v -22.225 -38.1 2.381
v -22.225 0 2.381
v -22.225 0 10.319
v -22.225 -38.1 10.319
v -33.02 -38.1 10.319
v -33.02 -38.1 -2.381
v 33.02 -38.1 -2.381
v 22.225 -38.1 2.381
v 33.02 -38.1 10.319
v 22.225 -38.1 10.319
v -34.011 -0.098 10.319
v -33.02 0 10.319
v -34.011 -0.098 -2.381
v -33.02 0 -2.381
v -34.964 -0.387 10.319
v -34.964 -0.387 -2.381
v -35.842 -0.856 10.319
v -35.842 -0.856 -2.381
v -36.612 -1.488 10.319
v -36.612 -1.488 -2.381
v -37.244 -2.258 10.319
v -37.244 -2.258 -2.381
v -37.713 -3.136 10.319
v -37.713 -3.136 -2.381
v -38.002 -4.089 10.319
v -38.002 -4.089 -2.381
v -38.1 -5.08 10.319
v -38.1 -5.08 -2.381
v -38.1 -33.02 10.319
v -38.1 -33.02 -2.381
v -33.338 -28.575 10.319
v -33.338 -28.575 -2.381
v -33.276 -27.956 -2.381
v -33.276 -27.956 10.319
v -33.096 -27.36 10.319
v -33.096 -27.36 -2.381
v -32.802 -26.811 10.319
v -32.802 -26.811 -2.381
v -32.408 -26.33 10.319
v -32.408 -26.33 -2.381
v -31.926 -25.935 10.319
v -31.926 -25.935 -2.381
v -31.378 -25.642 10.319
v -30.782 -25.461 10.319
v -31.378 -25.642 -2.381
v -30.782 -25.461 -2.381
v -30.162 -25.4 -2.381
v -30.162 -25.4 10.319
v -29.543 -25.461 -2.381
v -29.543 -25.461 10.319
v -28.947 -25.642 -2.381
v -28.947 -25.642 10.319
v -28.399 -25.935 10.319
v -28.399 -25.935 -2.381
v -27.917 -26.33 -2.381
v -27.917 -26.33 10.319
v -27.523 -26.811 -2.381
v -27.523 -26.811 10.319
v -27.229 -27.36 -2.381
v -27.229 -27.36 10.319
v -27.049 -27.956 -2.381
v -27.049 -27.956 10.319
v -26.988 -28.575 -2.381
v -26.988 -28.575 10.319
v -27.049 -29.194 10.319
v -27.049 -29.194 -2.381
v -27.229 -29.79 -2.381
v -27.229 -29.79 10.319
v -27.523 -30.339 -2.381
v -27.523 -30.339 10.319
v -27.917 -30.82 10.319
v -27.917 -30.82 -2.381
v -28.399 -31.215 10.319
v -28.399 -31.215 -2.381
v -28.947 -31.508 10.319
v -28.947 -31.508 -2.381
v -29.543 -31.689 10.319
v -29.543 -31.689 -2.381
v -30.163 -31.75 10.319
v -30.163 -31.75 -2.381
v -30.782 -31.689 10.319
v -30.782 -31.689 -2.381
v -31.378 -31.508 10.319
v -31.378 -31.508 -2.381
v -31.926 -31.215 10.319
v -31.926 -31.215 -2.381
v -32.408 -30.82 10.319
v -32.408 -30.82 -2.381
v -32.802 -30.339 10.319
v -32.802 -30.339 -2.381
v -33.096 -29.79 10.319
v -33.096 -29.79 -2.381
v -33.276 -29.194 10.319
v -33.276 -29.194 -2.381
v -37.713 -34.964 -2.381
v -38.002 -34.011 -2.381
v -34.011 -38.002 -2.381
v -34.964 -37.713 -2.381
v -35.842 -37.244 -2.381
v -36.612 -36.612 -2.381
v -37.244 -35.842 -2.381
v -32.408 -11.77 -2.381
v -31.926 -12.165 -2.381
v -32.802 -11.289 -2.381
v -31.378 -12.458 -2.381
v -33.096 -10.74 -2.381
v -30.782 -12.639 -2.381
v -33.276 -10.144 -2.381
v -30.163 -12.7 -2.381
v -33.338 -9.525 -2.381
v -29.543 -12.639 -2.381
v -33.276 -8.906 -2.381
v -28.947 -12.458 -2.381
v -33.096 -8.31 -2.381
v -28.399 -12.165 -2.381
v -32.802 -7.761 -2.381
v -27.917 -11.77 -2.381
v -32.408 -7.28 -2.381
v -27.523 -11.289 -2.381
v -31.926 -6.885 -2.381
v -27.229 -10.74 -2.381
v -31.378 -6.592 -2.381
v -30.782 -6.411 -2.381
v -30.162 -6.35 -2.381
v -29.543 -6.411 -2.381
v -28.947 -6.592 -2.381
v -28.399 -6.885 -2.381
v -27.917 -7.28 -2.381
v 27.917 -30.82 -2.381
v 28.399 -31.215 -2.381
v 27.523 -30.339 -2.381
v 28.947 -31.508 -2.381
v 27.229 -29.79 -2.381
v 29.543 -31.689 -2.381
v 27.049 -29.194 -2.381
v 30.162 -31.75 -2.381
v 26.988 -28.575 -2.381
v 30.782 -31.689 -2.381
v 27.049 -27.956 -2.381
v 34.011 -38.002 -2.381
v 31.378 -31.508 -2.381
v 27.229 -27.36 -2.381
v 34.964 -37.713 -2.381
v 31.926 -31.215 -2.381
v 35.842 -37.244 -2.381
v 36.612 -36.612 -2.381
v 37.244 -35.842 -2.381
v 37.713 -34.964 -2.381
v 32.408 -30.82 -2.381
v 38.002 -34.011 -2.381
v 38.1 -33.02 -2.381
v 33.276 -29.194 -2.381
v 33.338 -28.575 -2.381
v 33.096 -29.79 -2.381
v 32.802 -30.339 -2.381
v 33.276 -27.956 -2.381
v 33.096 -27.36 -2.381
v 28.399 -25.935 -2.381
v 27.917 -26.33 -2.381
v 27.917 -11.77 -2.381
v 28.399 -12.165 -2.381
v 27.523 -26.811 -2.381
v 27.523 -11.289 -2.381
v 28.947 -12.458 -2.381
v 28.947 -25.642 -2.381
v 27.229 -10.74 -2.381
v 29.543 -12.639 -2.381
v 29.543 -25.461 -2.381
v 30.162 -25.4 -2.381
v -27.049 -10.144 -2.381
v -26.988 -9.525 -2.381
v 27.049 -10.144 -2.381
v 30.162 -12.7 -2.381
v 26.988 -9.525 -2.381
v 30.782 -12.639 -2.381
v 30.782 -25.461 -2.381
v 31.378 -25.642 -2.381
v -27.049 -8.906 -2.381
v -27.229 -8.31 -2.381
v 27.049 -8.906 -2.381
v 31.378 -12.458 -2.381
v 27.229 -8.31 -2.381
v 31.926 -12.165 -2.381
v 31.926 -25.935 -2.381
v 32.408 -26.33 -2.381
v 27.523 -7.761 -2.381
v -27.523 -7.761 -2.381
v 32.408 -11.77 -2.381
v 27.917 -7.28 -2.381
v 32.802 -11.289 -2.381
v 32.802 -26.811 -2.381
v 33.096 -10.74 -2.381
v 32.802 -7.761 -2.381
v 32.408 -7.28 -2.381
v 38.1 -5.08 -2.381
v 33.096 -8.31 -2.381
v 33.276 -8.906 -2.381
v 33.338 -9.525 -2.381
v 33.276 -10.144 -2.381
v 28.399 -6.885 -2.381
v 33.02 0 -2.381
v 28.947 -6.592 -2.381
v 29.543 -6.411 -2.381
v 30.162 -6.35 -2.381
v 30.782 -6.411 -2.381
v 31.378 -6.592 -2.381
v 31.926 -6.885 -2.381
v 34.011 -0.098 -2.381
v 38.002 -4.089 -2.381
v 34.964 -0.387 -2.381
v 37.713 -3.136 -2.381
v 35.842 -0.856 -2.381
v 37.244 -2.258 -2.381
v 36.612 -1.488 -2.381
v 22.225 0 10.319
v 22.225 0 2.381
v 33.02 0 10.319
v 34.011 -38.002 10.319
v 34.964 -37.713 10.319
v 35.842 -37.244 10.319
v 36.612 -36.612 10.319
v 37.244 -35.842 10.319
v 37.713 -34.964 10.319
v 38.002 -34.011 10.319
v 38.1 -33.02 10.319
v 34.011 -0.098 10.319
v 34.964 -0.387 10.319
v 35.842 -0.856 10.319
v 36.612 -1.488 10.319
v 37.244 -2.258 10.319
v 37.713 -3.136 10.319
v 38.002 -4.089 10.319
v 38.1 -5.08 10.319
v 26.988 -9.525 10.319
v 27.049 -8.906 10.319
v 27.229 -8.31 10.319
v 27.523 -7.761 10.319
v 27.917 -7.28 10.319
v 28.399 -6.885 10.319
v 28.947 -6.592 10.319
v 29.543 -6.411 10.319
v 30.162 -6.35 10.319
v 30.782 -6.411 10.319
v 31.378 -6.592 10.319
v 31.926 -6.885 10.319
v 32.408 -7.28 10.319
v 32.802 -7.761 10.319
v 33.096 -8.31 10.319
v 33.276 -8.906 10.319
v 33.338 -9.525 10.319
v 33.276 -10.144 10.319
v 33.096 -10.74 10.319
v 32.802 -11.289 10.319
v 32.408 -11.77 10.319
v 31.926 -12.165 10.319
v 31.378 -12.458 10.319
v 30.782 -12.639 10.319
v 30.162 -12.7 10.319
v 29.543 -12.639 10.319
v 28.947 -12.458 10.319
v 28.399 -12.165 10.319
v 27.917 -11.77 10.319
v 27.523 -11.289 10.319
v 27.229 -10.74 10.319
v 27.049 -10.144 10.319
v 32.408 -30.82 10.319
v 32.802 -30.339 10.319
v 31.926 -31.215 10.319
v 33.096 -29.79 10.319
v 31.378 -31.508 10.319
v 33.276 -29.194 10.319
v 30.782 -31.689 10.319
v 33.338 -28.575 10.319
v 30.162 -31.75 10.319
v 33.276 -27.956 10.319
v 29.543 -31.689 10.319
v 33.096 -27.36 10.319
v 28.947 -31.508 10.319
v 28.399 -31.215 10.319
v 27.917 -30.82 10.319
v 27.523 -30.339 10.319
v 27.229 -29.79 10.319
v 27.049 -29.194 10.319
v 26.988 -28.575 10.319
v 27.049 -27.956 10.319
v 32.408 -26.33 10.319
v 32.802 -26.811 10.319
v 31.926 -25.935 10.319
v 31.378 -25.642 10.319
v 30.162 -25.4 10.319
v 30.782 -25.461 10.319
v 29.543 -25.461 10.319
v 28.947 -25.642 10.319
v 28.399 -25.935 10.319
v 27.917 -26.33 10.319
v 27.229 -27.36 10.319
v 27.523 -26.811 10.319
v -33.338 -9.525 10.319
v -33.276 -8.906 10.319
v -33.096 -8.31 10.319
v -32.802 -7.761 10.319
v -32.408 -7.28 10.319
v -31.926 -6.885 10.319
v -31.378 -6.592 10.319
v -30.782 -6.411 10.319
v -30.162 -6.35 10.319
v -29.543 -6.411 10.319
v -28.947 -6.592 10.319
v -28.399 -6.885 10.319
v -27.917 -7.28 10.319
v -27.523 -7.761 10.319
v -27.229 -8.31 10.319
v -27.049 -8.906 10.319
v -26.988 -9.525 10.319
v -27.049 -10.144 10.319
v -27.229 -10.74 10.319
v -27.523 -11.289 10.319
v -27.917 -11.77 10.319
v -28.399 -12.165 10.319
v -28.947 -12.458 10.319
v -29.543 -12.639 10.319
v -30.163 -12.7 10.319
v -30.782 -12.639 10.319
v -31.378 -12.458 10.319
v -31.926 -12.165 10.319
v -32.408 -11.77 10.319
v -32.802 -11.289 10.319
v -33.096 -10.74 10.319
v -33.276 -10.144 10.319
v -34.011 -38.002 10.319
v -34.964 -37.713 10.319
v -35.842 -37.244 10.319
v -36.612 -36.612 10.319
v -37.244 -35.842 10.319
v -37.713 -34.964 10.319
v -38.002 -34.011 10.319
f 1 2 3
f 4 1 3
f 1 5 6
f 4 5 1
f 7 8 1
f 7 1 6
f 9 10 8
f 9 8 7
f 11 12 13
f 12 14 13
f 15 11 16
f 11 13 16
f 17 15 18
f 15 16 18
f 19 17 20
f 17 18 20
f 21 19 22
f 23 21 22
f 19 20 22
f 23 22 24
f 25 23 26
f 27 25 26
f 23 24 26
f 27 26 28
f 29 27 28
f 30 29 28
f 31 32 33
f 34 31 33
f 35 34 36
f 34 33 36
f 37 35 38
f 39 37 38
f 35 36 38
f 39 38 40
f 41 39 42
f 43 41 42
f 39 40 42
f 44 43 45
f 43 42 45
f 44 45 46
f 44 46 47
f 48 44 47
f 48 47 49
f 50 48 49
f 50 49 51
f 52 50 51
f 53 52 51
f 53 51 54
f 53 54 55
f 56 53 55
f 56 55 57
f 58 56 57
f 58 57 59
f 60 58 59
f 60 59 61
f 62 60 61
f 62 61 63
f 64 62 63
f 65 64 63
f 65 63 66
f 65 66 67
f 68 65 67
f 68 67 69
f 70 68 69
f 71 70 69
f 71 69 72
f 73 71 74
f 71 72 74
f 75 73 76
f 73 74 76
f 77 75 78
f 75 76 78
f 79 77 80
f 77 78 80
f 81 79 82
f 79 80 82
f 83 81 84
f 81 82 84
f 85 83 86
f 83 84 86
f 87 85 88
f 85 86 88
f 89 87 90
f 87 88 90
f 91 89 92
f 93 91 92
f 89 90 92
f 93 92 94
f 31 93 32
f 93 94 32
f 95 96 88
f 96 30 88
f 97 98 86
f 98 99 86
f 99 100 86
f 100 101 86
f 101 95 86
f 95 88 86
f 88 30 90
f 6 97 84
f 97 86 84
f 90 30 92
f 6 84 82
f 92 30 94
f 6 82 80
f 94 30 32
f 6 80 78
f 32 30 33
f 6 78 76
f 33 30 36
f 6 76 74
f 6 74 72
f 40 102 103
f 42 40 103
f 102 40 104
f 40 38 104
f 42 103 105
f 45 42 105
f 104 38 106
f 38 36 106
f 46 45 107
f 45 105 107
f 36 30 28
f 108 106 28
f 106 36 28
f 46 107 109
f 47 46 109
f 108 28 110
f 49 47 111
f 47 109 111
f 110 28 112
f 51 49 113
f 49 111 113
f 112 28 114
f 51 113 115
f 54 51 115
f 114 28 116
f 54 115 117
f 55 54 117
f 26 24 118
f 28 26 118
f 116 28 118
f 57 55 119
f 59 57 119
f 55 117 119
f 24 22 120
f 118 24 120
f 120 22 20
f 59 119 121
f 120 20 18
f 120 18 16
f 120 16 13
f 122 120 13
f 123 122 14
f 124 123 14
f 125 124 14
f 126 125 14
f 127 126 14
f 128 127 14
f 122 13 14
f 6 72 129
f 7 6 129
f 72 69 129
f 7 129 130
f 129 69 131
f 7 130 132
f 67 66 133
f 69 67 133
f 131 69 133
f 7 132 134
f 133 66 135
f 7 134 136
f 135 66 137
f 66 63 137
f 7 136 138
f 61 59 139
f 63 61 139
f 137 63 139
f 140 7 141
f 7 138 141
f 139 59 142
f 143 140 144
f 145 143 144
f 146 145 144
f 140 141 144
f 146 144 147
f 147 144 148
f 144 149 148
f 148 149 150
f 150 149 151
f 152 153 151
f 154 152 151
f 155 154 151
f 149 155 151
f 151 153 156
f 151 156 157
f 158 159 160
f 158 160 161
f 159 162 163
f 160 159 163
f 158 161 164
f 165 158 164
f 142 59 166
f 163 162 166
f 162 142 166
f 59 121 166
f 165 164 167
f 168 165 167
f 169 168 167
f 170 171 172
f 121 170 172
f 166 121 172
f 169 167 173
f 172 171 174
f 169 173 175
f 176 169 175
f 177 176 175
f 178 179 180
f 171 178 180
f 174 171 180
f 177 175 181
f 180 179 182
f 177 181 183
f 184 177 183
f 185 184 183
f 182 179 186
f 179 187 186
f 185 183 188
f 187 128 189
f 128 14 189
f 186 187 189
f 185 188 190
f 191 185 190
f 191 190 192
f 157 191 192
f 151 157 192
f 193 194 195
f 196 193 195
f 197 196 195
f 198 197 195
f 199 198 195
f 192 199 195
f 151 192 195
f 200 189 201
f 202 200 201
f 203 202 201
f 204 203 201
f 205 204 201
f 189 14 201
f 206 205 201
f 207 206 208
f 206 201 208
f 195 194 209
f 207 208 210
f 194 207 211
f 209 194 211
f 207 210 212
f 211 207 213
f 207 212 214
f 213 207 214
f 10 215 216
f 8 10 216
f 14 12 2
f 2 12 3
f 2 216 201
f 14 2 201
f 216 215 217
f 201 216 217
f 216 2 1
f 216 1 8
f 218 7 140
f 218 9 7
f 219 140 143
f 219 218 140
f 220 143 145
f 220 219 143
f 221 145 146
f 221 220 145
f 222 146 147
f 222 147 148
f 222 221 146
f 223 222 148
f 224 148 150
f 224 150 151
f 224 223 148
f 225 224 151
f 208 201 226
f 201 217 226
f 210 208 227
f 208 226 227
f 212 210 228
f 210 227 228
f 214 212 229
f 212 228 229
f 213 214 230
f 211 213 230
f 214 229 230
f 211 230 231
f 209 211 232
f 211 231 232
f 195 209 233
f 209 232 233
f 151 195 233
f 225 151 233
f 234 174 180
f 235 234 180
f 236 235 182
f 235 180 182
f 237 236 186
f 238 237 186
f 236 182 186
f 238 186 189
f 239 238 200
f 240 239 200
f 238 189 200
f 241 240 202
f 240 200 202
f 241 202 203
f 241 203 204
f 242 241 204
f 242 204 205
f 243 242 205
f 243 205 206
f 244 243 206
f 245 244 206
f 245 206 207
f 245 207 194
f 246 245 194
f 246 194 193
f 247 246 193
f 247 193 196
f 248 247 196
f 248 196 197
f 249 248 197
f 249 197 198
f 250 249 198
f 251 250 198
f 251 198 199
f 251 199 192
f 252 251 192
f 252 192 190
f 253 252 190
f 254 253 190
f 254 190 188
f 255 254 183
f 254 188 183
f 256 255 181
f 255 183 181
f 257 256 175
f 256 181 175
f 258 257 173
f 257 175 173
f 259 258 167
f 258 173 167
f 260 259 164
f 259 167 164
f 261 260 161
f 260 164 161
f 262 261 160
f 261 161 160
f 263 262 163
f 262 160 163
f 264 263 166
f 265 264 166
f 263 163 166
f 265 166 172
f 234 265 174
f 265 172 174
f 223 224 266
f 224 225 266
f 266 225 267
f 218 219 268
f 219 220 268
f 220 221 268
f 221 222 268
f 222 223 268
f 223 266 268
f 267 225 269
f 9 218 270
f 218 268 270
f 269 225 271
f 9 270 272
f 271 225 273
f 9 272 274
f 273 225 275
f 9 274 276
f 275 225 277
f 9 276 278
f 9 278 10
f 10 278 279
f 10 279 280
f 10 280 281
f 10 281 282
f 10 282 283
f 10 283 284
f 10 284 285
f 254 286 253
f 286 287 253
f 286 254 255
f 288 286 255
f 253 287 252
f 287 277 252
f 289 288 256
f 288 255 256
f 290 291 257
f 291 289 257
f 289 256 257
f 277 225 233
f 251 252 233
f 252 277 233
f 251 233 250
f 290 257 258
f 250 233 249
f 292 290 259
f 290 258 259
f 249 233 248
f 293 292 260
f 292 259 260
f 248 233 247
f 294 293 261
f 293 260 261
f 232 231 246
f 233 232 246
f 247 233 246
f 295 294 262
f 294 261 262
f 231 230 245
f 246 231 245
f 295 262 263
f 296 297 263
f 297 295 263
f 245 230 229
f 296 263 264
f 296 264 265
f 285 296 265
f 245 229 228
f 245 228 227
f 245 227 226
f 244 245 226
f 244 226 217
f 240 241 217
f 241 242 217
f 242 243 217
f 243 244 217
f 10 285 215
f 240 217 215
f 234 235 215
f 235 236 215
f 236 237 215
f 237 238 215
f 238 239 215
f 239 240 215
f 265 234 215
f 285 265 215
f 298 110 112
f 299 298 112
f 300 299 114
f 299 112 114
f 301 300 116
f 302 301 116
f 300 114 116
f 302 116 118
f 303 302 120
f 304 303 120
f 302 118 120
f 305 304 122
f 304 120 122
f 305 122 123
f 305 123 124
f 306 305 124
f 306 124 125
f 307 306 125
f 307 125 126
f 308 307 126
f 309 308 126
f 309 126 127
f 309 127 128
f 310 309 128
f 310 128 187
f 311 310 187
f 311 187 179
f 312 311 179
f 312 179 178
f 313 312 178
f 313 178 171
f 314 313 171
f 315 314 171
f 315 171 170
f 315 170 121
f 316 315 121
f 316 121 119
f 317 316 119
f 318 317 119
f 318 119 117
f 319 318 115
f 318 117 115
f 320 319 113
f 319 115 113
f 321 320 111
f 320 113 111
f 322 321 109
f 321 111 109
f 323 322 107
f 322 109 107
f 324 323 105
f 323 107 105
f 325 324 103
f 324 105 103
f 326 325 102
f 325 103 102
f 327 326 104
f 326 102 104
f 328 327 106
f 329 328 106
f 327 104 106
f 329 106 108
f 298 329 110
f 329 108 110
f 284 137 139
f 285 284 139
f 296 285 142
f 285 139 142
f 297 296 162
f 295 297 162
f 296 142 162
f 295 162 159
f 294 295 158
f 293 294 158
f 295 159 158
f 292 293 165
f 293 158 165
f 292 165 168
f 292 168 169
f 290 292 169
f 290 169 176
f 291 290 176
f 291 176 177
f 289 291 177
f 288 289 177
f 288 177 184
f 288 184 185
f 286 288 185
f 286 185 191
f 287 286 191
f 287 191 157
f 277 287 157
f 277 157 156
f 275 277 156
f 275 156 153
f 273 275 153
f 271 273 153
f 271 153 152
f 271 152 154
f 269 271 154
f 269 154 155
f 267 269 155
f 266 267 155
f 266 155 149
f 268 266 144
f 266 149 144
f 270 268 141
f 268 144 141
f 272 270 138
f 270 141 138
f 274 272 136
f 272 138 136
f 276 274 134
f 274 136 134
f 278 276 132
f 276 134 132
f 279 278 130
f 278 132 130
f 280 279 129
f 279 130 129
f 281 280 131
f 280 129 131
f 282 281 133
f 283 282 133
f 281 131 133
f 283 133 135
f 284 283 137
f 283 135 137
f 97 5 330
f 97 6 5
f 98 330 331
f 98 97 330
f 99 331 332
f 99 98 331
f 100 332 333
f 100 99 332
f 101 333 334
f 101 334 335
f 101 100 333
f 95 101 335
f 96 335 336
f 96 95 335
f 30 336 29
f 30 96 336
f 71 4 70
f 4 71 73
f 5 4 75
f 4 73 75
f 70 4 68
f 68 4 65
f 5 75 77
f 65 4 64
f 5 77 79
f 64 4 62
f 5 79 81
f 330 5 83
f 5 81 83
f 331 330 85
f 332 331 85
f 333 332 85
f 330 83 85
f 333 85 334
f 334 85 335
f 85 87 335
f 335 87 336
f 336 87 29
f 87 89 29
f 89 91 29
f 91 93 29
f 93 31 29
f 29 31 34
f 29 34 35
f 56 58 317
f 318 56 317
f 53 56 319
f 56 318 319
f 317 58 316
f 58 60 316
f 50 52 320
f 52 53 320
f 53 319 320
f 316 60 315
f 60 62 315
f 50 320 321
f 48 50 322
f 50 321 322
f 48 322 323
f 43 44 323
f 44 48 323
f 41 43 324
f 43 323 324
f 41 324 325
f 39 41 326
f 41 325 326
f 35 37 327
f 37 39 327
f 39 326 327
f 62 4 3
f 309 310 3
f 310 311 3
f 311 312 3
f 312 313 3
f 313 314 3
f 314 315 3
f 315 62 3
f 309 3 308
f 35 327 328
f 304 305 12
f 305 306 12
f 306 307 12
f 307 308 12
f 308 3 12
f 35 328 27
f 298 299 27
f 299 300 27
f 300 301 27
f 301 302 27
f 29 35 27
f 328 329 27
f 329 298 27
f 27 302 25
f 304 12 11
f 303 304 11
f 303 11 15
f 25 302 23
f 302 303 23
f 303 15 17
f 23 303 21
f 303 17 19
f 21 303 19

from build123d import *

# Parameters (mm, degrees)
F0_W     = 44.45
F0_H     = 4.7625
F1_DEPTH = 38.1
F3_D     = 6.35
F4_R     = 5.08


with BuildPart() as f1:
    # F0 (on Front) → F1 (new body)
    with BuildSketch(Plane.XZ):
        Polygon((-22.225, -2.38125), (-22.225, 2.38125), (-22.225, 10.31875), (-38.1, 10.31875), (-38.1, -2.38125), align=None)
        Rectangle(F0_W, F0_H)
        Polygon((22.225, 10.31875), (22.225, 2.38125), (22.225, -2.38125), (38.1, -2.38125), (38.1, 10.31875), align=None)
    extrude(amount=F1_DEPTH)

    # F3 (through all)
    with Locations(Plane.XY.offset(10.31875)):
        with Locations((-30.1625, -9.525), (-30.1625, -28.575), (30.1625, -9.525), (30.1625, -28.575)):
            Hole(F3_D / 2)

    # F4
    f4_edges = [f1.edges().sort_by_distance(p)[0] for p in [
        (38.1, 0, 3.96875),
        (38.1, -38.1, 3.96875),
        (-38.1, 0, 3.96875),
        (-38.1, -38.1, 3.96875),
    ]]
    fillet(f4_edges, radius=F4_R)


solid = f1.part
